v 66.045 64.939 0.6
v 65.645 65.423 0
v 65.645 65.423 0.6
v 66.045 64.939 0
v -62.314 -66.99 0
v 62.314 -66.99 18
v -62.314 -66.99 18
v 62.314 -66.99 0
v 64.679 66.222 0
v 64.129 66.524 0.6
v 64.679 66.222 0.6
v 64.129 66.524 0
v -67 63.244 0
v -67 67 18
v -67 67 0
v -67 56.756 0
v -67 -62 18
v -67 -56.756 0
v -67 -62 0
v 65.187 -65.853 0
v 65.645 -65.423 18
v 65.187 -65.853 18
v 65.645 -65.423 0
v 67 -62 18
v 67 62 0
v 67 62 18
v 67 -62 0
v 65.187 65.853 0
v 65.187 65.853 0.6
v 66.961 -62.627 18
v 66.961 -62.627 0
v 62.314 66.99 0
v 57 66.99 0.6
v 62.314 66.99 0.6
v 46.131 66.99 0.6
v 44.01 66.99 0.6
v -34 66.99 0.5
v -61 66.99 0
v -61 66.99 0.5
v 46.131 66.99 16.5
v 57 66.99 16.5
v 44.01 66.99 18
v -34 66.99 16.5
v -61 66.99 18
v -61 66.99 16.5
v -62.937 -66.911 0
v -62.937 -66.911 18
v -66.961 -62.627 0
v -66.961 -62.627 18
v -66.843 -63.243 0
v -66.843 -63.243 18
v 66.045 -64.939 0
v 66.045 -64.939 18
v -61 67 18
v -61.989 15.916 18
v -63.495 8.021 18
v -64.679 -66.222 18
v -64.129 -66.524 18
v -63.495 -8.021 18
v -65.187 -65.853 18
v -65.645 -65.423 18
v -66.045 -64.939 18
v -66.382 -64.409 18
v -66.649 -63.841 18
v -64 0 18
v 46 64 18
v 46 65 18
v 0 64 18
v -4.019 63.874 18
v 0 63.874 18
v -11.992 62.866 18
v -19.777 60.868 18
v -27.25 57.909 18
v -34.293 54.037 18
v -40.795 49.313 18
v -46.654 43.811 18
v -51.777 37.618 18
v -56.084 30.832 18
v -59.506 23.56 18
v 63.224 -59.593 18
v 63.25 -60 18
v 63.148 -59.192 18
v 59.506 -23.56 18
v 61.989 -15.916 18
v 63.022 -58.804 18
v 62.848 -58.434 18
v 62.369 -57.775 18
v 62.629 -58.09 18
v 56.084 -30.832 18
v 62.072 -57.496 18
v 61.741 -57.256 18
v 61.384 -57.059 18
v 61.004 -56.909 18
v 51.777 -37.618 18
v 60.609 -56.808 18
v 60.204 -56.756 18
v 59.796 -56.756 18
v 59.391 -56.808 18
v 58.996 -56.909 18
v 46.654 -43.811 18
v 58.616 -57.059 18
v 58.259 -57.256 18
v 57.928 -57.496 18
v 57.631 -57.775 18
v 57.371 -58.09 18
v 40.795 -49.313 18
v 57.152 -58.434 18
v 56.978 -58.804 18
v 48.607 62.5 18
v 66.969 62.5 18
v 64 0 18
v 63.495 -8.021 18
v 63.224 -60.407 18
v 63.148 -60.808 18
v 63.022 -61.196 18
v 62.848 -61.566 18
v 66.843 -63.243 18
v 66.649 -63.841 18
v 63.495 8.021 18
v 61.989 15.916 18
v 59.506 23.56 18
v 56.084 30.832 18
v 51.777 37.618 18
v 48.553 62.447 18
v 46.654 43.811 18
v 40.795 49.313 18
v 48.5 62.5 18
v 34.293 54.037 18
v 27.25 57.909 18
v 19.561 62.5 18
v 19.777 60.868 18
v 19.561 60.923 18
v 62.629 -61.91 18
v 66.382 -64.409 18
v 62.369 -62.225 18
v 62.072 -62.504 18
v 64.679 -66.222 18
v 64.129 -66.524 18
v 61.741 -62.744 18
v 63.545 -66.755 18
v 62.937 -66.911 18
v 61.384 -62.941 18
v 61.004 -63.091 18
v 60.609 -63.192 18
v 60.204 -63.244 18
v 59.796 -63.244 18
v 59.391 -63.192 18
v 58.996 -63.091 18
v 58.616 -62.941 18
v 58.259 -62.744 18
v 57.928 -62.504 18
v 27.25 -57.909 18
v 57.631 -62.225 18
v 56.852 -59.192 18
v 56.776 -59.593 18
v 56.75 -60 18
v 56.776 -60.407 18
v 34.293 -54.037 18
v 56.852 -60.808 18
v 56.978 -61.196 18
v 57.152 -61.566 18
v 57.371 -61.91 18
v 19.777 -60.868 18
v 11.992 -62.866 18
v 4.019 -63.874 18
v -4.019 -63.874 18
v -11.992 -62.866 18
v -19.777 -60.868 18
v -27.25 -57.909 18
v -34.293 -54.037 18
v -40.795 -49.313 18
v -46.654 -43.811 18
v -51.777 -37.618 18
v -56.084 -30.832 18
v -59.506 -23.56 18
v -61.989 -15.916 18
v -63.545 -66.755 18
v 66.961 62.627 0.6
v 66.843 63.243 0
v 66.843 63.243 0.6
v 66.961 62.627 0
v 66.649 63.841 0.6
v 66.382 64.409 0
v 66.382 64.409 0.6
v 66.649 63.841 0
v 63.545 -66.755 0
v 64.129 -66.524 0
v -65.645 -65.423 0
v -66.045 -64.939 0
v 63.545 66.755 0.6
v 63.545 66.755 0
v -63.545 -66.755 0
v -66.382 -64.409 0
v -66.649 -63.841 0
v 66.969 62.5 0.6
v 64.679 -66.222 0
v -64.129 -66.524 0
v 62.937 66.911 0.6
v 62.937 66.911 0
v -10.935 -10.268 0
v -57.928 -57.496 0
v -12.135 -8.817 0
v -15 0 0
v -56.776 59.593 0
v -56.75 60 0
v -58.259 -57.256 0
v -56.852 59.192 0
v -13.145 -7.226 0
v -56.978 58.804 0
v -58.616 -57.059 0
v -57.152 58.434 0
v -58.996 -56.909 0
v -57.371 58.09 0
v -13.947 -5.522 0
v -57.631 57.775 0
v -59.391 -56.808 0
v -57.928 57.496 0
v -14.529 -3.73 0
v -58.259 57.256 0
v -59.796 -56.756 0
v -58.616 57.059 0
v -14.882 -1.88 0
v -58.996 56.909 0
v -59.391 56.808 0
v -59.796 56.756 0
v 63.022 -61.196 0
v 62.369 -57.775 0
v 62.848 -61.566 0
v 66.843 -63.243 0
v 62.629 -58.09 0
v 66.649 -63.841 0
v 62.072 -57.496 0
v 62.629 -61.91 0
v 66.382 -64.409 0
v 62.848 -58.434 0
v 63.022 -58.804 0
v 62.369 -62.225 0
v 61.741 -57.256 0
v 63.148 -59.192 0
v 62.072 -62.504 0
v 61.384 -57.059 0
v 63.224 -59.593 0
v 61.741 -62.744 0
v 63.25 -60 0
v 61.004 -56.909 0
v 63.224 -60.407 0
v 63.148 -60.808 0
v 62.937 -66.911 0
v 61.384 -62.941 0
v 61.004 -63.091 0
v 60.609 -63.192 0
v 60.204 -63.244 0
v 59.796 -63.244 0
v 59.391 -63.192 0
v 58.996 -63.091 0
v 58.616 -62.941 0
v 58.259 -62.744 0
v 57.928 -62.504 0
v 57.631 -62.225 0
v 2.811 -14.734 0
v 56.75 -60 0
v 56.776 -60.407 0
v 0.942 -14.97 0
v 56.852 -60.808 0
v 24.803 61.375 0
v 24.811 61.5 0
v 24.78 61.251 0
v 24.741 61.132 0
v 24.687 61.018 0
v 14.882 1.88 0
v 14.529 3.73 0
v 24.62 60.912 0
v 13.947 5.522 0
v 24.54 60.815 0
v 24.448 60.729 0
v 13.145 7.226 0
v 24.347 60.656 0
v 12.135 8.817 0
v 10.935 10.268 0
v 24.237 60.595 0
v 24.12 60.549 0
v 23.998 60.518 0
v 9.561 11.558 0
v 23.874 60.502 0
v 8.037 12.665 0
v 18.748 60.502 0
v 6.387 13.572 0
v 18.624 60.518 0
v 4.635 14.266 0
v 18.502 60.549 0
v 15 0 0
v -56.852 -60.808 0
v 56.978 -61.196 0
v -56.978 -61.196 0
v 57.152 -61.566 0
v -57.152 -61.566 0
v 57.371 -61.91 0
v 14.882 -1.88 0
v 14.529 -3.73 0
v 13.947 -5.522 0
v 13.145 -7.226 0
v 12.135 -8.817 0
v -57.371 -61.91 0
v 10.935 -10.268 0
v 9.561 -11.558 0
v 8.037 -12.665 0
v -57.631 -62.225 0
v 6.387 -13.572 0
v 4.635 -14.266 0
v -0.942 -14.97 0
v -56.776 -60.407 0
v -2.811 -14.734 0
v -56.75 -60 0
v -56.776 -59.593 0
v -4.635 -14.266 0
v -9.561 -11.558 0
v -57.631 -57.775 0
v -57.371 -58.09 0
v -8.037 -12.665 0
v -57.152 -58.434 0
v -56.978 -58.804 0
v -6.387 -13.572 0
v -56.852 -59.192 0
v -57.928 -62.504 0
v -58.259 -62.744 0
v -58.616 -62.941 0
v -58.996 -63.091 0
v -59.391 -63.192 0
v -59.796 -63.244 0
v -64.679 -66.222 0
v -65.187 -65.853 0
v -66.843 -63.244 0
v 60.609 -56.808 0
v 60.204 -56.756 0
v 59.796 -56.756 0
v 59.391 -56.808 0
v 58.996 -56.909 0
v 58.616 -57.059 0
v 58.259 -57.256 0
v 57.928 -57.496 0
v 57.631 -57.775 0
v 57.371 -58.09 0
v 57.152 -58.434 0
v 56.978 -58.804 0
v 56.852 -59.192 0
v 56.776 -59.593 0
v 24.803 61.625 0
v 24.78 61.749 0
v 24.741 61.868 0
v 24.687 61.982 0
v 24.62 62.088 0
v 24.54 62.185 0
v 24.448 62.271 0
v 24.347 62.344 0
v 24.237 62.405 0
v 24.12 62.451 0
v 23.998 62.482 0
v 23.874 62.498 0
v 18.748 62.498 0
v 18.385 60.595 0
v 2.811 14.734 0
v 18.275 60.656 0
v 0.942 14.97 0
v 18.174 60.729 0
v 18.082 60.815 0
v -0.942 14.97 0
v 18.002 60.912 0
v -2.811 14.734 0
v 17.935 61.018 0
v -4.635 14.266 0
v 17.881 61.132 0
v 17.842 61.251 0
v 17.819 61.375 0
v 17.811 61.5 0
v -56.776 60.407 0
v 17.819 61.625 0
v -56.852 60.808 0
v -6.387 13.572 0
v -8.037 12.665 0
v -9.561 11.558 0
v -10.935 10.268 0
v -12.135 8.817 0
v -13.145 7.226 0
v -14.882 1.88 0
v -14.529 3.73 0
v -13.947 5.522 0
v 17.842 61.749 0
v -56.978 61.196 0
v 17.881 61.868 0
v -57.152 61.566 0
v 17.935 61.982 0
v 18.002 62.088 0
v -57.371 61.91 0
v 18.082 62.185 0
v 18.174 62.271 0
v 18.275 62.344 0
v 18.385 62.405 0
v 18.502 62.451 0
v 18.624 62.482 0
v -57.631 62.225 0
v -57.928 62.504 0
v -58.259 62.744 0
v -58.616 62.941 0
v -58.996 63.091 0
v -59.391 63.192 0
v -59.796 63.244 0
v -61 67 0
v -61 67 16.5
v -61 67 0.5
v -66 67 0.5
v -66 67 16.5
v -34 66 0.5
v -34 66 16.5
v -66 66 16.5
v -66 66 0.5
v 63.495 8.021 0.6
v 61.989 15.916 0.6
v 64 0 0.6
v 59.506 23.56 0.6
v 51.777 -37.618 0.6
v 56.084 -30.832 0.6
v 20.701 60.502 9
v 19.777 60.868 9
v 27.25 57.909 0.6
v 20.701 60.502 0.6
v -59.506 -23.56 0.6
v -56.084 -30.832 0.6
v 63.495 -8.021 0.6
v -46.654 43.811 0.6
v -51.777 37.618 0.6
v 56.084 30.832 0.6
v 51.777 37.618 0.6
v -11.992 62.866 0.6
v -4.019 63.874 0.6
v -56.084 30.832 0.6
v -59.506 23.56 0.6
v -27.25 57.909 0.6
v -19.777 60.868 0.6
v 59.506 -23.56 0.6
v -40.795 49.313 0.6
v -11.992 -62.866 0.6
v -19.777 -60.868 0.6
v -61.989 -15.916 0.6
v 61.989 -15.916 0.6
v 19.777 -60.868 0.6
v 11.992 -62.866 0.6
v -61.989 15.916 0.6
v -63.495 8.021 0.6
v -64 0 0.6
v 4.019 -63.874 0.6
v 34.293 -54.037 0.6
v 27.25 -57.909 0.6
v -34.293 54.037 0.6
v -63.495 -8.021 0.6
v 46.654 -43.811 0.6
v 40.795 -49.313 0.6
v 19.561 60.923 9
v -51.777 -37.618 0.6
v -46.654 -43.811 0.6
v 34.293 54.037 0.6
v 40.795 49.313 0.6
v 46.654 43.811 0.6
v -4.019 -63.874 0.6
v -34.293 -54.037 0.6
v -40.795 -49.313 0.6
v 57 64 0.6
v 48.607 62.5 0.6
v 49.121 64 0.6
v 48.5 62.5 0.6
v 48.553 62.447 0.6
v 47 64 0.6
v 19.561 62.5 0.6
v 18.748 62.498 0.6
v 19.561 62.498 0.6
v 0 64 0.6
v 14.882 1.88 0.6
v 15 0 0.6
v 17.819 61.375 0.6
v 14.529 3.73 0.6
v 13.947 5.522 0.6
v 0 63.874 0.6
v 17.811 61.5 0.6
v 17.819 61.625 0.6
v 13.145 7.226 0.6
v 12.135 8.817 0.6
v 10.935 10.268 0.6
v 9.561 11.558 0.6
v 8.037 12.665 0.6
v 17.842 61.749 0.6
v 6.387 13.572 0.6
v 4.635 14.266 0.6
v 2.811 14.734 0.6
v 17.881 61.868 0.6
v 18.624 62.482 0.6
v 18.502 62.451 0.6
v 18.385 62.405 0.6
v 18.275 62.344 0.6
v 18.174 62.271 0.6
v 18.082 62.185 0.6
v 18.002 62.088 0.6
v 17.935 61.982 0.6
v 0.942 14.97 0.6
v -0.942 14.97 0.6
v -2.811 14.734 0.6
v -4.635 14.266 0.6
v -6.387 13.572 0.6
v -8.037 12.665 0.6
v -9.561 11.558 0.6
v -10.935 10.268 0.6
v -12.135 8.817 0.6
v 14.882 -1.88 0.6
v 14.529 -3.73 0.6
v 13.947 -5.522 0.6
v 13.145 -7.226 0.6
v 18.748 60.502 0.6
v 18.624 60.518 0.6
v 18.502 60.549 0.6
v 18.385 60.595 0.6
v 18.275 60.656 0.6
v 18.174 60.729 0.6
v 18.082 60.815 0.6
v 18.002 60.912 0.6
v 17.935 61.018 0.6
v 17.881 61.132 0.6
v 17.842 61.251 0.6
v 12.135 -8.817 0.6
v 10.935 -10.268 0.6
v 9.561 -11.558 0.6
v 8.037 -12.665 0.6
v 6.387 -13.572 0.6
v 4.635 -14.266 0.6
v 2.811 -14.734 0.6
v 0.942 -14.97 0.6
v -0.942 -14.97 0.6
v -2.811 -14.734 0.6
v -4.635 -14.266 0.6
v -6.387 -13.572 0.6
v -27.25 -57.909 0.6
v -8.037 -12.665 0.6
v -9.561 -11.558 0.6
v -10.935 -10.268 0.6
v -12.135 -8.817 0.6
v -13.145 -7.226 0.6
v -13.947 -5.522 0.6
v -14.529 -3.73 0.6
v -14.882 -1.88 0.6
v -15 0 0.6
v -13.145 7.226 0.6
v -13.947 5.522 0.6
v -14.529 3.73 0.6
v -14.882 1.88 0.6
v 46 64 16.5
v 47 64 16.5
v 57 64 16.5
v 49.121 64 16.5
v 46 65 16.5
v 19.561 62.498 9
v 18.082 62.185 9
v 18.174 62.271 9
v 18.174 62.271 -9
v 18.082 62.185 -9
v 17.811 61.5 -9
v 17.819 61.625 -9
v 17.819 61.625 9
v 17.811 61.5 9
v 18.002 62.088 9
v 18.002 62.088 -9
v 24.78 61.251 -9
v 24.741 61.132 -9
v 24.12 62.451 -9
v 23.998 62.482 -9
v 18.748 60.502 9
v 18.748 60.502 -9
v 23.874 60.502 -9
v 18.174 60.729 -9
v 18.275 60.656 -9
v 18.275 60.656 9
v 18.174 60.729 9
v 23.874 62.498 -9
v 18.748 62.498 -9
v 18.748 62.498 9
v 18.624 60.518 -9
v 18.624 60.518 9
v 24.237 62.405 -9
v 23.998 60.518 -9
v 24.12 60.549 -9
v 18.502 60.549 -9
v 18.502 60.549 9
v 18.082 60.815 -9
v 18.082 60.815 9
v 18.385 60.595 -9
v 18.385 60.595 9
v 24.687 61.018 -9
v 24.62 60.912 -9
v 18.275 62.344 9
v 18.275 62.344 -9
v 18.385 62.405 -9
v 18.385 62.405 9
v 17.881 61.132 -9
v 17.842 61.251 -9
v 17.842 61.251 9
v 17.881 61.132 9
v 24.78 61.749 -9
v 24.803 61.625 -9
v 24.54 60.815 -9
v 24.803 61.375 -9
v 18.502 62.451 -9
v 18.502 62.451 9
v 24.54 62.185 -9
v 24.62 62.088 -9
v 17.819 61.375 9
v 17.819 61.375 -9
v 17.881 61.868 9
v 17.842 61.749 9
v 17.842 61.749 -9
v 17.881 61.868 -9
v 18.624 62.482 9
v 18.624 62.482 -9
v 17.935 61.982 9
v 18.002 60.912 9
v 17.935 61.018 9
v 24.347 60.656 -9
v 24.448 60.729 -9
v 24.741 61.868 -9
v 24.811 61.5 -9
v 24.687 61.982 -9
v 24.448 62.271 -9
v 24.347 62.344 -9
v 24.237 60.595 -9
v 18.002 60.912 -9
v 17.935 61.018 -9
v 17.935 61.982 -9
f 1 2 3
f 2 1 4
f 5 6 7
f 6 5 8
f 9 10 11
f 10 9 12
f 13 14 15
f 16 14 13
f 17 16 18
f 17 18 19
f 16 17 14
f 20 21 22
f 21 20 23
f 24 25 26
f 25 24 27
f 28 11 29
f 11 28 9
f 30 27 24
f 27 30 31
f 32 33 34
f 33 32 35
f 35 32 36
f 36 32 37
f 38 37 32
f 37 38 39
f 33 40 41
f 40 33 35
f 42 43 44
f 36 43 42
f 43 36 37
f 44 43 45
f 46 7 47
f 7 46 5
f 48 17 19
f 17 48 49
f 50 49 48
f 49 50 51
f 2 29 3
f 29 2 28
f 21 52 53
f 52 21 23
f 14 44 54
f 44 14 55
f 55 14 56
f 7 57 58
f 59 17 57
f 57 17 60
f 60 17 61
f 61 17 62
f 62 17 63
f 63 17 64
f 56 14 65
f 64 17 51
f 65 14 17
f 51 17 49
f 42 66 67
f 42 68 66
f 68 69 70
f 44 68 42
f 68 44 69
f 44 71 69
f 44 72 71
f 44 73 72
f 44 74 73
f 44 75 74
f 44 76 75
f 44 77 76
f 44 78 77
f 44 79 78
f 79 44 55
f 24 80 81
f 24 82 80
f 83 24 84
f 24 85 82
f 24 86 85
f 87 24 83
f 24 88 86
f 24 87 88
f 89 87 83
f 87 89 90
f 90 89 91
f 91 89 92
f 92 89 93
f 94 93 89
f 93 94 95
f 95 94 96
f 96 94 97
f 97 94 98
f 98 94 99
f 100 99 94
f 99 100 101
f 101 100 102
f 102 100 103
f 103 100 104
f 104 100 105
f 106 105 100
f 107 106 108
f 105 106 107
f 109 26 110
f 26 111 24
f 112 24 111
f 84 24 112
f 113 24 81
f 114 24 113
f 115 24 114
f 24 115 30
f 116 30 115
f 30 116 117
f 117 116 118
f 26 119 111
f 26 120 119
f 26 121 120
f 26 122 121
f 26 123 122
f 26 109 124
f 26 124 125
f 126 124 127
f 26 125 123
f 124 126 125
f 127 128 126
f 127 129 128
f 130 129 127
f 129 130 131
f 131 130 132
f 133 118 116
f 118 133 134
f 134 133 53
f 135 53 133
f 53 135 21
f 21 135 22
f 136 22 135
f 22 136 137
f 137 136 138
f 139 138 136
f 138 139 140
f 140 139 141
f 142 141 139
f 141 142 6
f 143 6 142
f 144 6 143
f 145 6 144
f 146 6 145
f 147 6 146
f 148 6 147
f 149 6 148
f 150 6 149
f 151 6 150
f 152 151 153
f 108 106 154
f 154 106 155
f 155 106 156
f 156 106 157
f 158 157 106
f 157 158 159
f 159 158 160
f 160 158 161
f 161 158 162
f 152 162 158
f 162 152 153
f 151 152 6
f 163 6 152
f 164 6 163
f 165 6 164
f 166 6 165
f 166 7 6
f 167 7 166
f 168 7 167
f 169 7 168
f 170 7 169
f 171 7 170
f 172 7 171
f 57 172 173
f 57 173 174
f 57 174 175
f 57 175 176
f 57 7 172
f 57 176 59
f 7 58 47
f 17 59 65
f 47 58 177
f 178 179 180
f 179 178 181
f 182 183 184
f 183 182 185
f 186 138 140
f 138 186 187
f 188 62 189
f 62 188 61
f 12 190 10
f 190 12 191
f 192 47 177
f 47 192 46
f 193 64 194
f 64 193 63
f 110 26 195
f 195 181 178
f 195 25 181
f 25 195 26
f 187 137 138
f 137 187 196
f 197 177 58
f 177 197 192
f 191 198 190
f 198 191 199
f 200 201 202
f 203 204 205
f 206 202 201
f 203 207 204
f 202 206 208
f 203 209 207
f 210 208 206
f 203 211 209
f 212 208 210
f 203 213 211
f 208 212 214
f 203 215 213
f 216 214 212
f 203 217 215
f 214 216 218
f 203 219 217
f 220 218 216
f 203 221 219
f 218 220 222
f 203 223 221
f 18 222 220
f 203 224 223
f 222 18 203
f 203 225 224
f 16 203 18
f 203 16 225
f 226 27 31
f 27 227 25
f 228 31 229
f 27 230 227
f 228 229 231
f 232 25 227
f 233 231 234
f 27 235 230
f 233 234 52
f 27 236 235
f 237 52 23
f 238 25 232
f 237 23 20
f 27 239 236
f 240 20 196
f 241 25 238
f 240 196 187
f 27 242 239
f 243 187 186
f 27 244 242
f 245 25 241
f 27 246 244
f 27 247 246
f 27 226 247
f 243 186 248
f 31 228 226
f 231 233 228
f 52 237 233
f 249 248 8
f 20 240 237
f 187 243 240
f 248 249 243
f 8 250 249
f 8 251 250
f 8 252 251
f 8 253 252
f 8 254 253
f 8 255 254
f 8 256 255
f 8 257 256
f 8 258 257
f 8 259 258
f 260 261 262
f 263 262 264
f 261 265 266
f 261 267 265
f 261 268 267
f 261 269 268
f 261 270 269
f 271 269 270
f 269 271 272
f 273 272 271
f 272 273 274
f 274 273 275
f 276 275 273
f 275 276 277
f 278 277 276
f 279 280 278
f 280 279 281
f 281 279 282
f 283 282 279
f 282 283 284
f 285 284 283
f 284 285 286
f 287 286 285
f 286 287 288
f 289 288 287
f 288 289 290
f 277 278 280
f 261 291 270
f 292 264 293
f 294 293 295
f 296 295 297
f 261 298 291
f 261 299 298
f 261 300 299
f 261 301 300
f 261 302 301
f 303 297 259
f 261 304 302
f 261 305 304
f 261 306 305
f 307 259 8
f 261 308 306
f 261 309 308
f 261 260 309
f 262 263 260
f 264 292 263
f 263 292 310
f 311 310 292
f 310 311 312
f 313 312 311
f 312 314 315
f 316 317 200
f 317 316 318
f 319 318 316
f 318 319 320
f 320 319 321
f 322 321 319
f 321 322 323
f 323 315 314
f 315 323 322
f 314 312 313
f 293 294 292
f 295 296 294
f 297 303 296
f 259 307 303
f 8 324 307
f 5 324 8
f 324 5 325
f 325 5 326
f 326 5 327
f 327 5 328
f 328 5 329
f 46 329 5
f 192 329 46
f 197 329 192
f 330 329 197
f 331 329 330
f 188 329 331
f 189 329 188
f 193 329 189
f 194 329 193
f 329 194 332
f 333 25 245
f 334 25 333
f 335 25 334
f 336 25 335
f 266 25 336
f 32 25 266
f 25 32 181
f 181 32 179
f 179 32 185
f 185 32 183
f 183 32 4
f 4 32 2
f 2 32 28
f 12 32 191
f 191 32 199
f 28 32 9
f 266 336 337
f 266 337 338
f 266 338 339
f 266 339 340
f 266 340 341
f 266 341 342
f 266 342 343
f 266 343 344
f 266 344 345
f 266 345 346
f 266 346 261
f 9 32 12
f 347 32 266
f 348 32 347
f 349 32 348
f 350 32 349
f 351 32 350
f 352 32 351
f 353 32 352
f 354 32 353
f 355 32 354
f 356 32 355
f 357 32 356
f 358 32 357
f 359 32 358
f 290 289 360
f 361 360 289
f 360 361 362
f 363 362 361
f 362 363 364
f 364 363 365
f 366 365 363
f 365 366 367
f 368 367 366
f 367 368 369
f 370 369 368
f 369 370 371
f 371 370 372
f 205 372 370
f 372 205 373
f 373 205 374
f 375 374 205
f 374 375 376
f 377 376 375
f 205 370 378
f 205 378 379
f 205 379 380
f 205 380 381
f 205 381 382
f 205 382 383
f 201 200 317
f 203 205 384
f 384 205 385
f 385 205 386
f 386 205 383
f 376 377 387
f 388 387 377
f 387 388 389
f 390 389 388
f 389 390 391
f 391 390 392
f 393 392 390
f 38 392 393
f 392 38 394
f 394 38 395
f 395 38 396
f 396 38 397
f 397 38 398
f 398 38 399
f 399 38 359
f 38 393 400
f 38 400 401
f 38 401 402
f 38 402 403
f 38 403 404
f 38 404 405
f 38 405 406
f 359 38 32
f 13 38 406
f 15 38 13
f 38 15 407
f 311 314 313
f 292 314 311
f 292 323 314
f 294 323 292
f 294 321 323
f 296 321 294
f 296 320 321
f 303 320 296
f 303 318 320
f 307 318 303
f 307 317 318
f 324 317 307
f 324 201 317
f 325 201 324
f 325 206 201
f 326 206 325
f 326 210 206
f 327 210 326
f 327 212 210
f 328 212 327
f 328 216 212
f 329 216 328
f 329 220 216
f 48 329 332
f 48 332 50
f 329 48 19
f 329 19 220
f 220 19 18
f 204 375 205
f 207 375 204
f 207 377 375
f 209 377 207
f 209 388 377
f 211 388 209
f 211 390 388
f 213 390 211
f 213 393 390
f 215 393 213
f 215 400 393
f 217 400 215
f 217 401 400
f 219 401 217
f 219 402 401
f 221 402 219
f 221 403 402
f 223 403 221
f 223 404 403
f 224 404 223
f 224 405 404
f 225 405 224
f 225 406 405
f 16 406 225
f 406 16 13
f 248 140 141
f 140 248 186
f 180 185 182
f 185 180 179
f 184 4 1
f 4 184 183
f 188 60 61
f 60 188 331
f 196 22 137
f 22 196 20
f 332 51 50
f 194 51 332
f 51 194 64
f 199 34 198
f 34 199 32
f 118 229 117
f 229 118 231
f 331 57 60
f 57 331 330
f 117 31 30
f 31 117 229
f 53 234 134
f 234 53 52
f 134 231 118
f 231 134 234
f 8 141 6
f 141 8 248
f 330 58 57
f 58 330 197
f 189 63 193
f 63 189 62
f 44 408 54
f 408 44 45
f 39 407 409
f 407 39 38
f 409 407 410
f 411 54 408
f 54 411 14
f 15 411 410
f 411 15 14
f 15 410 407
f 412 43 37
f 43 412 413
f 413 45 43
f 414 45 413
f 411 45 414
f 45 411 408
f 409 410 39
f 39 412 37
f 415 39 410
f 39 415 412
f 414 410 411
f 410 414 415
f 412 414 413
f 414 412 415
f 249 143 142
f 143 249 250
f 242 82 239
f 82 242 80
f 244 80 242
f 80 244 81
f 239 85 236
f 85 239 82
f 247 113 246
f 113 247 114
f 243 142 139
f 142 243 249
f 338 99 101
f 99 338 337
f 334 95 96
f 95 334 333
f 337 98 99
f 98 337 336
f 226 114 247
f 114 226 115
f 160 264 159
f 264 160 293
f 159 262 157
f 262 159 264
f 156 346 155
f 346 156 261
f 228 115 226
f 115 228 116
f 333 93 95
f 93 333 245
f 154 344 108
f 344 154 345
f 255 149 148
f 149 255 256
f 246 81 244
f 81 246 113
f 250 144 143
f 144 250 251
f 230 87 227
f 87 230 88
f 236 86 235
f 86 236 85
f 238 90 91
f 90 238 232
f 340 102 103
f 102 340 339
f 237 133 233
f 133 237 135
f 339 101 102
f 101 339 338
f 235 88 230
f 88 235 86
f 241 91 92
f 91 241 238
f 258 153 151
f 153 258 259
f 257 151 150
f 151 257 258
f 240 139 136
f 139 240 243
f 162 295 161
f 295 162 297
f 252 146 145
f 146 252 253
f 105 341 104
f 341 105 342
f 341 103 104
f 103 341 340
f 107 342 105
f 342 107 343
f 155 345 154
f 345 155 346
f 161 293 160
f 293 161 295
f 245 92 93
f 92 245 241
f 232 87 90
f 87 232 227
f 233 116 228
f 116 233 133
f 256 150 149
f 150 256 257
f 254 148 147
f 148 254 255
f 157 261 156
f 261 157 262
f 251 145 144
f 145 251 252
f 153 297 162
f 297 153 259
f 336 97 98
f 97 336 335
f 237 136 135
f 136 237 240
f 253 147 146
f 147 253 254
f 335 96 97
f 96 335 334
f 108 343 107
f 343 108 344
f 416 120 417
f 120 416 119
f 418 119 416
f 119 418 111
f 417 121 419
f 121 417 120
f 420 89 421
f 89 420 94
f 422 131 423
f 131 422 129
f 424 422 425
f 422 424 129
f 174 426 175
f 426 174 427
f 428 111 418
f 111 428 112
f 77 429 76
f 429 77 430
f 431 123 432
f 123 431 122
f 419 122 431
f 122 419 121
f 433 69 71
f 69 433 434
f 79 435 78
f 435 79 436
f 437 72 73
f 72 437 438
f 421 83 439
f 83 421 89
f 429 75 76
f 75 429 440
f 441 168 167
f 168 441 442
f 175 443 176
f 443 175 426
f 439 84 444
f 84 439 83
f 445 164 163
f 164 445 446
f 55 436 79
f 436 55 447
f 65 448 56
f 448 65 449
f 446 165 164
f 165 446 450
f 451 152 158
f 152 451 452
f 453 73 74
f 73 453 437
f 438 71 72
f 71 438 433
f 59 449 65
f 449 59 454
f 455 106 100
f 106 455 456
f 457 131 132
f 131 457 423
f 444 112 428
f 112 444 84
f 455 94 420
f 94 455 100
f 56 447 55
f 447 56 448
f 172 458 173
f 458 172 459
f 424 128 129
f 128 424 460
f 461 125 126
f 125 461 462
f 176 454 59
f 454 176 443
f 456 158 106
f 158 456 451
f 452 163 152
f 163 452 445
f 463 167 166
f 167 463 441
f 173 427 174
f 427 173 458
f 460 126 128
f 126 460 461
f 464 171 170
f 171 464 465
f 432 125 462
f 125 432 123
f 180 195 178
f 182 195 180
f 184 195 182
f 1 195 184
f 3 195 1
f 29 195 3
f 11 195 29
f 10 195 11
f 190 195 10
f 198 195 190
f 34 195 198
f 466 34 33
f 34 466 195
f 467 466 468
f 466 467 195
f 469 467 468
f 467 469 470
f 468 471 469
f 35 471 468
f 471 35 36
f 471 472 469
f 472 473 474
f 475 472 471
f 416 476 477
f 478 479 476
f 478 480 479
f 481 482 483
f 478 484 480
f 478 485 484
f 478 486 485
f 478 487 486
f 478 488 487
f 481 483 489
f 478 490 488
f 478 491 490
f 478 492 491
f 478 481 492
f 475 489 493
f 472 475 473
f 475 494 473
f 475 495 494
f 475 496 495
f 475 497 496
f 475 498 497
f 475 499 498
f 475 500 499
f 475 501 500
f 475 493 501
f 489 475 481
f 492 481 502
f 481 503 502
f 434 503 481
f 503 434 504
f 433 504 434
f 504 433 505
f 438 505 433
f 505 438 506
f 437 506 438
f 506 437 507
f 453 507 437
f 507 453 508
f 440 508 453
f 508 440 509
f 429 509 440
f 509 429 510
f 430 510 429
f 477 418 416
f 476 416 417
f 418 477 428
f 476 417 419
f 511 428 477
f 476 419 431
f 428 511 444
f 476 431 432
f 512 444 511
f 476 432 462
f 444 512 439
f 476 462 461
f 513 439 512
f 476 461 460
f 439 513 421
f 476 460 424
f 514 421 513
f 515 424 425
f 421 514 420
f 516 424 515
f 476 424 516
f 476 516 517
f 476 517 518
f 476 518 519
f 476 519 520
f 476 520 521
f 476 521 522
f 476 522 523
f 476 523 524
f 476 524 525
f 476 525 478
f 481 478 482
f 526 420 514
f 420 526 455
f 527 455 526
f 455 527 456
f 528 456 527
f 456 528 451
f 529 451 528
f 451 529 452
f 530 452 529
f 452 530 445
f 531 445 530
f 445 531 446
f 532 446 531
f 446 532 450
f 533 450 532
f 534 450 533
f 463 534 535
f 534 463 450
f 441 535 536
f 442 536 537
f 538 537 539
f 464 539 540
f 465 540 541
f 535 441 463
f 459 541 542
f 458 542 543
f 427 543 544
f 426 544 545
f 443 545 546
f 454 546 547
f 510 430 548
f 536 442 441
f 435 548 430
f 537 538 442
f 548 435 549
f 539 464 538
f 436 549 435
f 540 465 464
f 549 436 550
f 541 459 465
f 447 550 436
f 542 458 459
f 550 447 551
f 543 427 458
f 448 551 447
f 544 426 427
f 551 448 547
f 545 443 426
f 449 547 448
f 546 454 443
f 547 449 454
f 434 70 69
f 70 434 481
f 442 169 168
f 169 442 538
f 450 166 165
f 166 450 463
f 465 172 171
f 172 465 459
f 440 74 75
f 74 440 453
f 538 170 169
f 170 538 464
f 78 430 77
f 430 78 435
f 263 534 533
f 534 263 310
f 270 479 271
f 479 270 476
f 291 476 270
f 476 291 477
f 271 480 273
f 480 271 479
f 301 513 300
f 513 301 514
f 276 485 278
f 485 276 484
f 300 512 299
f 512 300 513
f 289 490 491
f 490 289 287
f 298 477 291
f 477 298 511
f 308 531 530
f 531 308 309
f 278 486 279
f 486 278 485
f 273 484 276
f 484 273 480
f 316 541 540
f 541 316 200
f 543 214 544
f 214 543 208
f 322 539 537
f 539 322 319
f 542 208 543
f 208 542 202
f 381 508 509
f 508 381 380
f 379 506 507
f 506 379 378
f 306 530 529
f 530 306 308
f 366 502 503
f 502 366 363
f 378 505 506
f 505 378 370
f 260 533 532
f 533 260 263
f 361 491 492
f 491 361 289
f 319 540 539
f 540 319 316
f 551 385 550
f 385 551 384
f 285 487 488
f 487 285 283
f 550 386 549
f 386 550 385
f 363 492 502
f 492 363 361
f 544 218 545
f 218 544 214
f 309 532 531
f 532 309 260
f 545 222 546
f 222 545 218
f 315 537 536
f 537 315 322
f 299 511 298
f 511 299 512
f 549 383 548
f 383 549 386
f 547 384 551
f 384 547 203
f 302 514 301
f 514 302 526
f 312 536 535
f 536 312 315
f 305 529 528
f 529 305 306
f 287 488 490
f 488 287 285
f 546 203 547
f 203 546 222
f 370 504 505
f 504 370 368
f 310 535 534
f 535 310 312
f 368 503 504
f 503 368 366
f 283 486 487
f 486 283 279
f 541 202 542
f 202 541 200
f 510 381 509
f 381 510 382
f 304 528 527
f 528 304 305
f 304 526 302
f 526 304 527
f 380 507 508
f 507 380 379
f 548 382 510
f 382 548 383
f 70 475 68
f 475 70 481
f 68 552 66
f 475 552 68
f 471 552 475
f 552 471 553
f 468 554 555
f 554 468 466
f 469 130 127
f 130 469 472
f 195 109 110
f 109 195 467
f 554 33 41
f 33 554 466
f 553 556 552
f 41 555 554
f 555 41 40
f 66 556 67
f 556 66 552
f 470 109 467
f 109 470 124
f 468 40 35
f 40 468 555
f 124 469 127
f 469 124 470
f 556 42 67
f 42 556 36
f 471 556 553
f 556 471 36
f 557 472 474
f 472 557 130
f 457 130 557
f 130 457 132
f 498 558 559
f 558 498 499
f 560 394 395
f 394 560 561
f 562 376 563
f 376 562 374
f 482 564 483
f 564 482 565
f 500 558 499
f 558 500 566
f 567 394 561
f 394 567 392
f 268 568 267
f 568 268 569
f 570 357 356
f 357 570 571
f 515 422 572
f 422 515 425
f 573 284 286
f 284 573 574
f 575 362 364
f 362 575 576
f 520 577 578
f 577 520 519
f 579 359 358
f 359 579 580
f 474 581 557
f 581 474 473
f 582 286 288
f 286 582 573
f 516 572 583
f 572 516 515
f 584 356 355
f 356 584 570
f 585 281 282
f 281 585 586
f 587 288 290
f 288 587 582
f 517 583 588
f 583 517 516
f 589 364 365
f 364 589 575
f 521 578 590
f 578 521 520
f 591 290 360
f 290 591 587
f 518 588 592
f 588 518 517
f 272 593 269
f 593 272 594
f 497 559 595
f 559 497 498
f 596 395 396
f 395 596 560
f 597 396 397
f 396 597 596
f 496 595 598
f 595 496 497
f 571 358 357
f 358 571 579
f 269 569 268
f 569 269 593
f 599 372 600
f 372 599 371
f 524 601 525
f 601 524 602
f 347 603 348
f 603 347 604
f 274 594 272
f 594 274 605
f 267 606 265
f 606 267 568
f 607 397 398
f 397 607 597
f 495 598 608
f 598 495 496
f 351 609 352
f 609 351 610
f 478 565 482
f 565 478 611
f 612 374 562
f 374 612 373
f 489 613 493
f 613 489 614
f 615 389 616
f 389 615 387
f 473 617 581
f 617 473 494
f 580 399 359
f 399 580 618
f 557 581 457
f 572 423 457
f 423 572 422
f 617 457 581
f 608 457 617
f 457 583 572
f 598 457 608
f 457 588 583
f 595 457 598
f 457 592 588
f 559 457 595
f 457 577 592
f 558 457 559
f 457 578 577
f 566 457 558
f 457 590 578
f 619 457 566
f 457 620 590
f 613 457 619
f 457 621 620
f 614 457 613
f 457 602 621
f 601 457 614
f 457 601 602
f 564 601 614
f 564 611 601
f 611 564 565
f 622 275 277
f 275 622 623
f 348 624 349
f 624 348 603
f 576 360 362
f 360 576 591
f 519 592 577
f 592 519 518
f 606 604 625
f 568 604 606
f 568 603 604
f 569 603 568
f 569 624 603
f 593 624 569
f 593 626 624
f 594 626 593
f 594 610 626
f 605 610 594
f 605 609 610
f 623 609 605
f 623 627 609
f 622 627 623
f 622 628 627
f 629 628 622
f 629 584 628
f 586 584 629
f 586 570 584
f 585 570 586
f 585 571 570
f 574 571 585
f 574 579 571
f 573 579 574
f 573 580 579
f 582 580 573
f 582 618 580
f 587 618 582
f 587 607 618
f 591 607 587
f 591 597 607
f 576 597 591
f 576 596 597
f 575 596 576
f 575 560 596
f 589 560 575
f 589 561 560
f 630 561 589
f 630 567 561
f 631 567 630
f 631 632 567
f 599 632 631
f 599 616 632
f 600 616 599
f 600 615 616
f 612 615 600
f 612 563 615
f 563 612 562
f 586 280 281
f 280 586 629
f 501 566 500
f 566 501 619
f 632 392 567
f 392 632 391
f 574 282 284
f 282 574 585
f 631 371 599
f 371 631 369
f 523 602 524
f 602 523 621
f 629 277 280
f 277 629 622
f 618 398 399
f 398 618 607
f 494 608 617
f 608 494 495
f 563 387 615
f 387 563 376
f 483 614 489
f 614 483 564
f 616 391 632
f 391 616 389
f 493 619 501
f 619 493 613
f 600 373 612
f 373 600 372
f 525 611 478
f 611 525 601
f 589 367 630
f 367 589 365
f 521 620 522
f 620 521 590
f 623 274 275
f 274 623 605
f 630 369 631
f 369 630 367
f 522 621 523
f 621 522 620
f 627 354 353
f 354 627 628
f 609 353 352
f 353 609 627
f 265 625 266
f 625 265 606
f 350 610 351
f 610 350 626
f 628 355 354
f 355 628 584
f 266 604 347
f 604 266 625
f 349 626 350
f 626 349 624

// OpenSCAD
$fn = 50;


union() {
	difference() {
		union() {
			hull() {
				translate(v = [-62.0000000000, 62.0000000000, 0]) {
					cylinder(h = 18, r = 5);
				}
				translate(v = [62.0000000000, 62.0000000000, 0]) {
					cylinder(h = 18, r = 5);
				}
				translate(v = [-62.0000000000, -62.0000000000, 0]) {
					cylinder(h = 18, r = 5);
				}
				translate(v = [62.0000000000, -62.0000000000, 0]) {
					cylinder(h = 18, r = 5);
				}
			}
			translate(v = [-67.0000000000, 61.0000000000, 0]) {
				cube(size = [6, 6, 18]);
			}
		}
		union() {
			translate(v = [-67.5000000000, -60.0000000000, -250.0000000000]) {
				rotate(a = [0, 0, 0]) {
					difference() {
						union() {
							hull() {
								translate(v = [7.5000000000, 0, 0]) {
									cylinder(h = 250, r = 3.2500000000, r1 = 3.2500000000, r2 = 3.2500000000);
								}
								translate(v = [-7.5000000000, 0, 0]) {
									cylinder(h = 250, r = 3.2500000000, r1 = 3.2500000000, r2 = 3.2500000000);
								}
							}
						}
						union();
					}
				}
			}
			translate(v = [-67.5000000000, 60.0000000000, -250.0000000000]) {
				rotate(a = [0, 0, 0]) {
					difference() {
						union() {
							hull() {
								translate(v = [7.5000000000, 0, 0]) {
									cylinder(h = 250, r = 3.2500000000, r1 = 3.2500000000, r2 = 3.2500000000);
								}
								translate(v = [-7.5000000000, 0, 0]) {
									cylinder(h = 250, r = 3.2500000000, r1 = 3.2500000000, r2 = 3.2500000000);
								}
							}
						}
						union();
					}
				}
			}
			translate(v = [-66.0000000000, 66.0000000000, 0.5000000000]) {
				cube(size = [32, 1, 16]);
			}
			translate(v = [60.0000000000, -60.0000000000, 0]) {
				cylinder(h = 100, r = 3.2500000000);
			}
			translate(v = [0, 0, 0.6000000000]) {
				cylinder(h = 20.4000000000, r = 64.0000000000);
			}
			translate(v = [0, 0, -9.0000000000]) {
				cylinder(h = 18, r = 15.0000000000);
			}
			translate(v = [0.0000000000, 62.5000000000, 0.6000000000]) {
				cube(size = [67.0000000000, 1.5000000000, 20.4000000000]);
			}
			translate(v = [57.0000000000, 62.5000000000, 0.6000000000]) {
				cube(size = [10, 4.5000000000, 20.4000000000]);
			}
			translate(v = [46.0000000000, 62.5000000000, 16.5000000000]) {
				cube(size = [21, 4.5000000000, 1.5000000000]);
			}
			translate(v = [43.2500000000, 67.7500000000, 0.6000000000]) {
				rotate(a = [0, 0, -45]) {
					cube(size = [7.5000000000, 1.5000000000, 20.4000000000]);
				}
			}
			translate(v = [12.0610000000, 60.5000000000, 0.6000000000]) {
				cube(size = [7.5000000000, 2, 17.4000000000]);
			}
		}
	}
	union() {
		translate(v = [21.3110000000, 61.5000000000, -9.0000000000]) {
			rotate(a = [0, 0, 0]) {
				difference() {
					union() {
						#hull() {
							#translate(v = [2.5000000000, 0, 0]) {
								cylinder(h = 18, r = 1.0000000000, r1 = 1.0000000000, r2 = 1.0000000000);
							}
							#translate(v = [-2.5000000000, 0, 0]) {
								cylinder(h = 18, r = 1.0000000000, r1 = 1.0000000000, r2 = 1.0000000000);
							}
						}
					}
					union();
				}
			}
		}
	}
}
